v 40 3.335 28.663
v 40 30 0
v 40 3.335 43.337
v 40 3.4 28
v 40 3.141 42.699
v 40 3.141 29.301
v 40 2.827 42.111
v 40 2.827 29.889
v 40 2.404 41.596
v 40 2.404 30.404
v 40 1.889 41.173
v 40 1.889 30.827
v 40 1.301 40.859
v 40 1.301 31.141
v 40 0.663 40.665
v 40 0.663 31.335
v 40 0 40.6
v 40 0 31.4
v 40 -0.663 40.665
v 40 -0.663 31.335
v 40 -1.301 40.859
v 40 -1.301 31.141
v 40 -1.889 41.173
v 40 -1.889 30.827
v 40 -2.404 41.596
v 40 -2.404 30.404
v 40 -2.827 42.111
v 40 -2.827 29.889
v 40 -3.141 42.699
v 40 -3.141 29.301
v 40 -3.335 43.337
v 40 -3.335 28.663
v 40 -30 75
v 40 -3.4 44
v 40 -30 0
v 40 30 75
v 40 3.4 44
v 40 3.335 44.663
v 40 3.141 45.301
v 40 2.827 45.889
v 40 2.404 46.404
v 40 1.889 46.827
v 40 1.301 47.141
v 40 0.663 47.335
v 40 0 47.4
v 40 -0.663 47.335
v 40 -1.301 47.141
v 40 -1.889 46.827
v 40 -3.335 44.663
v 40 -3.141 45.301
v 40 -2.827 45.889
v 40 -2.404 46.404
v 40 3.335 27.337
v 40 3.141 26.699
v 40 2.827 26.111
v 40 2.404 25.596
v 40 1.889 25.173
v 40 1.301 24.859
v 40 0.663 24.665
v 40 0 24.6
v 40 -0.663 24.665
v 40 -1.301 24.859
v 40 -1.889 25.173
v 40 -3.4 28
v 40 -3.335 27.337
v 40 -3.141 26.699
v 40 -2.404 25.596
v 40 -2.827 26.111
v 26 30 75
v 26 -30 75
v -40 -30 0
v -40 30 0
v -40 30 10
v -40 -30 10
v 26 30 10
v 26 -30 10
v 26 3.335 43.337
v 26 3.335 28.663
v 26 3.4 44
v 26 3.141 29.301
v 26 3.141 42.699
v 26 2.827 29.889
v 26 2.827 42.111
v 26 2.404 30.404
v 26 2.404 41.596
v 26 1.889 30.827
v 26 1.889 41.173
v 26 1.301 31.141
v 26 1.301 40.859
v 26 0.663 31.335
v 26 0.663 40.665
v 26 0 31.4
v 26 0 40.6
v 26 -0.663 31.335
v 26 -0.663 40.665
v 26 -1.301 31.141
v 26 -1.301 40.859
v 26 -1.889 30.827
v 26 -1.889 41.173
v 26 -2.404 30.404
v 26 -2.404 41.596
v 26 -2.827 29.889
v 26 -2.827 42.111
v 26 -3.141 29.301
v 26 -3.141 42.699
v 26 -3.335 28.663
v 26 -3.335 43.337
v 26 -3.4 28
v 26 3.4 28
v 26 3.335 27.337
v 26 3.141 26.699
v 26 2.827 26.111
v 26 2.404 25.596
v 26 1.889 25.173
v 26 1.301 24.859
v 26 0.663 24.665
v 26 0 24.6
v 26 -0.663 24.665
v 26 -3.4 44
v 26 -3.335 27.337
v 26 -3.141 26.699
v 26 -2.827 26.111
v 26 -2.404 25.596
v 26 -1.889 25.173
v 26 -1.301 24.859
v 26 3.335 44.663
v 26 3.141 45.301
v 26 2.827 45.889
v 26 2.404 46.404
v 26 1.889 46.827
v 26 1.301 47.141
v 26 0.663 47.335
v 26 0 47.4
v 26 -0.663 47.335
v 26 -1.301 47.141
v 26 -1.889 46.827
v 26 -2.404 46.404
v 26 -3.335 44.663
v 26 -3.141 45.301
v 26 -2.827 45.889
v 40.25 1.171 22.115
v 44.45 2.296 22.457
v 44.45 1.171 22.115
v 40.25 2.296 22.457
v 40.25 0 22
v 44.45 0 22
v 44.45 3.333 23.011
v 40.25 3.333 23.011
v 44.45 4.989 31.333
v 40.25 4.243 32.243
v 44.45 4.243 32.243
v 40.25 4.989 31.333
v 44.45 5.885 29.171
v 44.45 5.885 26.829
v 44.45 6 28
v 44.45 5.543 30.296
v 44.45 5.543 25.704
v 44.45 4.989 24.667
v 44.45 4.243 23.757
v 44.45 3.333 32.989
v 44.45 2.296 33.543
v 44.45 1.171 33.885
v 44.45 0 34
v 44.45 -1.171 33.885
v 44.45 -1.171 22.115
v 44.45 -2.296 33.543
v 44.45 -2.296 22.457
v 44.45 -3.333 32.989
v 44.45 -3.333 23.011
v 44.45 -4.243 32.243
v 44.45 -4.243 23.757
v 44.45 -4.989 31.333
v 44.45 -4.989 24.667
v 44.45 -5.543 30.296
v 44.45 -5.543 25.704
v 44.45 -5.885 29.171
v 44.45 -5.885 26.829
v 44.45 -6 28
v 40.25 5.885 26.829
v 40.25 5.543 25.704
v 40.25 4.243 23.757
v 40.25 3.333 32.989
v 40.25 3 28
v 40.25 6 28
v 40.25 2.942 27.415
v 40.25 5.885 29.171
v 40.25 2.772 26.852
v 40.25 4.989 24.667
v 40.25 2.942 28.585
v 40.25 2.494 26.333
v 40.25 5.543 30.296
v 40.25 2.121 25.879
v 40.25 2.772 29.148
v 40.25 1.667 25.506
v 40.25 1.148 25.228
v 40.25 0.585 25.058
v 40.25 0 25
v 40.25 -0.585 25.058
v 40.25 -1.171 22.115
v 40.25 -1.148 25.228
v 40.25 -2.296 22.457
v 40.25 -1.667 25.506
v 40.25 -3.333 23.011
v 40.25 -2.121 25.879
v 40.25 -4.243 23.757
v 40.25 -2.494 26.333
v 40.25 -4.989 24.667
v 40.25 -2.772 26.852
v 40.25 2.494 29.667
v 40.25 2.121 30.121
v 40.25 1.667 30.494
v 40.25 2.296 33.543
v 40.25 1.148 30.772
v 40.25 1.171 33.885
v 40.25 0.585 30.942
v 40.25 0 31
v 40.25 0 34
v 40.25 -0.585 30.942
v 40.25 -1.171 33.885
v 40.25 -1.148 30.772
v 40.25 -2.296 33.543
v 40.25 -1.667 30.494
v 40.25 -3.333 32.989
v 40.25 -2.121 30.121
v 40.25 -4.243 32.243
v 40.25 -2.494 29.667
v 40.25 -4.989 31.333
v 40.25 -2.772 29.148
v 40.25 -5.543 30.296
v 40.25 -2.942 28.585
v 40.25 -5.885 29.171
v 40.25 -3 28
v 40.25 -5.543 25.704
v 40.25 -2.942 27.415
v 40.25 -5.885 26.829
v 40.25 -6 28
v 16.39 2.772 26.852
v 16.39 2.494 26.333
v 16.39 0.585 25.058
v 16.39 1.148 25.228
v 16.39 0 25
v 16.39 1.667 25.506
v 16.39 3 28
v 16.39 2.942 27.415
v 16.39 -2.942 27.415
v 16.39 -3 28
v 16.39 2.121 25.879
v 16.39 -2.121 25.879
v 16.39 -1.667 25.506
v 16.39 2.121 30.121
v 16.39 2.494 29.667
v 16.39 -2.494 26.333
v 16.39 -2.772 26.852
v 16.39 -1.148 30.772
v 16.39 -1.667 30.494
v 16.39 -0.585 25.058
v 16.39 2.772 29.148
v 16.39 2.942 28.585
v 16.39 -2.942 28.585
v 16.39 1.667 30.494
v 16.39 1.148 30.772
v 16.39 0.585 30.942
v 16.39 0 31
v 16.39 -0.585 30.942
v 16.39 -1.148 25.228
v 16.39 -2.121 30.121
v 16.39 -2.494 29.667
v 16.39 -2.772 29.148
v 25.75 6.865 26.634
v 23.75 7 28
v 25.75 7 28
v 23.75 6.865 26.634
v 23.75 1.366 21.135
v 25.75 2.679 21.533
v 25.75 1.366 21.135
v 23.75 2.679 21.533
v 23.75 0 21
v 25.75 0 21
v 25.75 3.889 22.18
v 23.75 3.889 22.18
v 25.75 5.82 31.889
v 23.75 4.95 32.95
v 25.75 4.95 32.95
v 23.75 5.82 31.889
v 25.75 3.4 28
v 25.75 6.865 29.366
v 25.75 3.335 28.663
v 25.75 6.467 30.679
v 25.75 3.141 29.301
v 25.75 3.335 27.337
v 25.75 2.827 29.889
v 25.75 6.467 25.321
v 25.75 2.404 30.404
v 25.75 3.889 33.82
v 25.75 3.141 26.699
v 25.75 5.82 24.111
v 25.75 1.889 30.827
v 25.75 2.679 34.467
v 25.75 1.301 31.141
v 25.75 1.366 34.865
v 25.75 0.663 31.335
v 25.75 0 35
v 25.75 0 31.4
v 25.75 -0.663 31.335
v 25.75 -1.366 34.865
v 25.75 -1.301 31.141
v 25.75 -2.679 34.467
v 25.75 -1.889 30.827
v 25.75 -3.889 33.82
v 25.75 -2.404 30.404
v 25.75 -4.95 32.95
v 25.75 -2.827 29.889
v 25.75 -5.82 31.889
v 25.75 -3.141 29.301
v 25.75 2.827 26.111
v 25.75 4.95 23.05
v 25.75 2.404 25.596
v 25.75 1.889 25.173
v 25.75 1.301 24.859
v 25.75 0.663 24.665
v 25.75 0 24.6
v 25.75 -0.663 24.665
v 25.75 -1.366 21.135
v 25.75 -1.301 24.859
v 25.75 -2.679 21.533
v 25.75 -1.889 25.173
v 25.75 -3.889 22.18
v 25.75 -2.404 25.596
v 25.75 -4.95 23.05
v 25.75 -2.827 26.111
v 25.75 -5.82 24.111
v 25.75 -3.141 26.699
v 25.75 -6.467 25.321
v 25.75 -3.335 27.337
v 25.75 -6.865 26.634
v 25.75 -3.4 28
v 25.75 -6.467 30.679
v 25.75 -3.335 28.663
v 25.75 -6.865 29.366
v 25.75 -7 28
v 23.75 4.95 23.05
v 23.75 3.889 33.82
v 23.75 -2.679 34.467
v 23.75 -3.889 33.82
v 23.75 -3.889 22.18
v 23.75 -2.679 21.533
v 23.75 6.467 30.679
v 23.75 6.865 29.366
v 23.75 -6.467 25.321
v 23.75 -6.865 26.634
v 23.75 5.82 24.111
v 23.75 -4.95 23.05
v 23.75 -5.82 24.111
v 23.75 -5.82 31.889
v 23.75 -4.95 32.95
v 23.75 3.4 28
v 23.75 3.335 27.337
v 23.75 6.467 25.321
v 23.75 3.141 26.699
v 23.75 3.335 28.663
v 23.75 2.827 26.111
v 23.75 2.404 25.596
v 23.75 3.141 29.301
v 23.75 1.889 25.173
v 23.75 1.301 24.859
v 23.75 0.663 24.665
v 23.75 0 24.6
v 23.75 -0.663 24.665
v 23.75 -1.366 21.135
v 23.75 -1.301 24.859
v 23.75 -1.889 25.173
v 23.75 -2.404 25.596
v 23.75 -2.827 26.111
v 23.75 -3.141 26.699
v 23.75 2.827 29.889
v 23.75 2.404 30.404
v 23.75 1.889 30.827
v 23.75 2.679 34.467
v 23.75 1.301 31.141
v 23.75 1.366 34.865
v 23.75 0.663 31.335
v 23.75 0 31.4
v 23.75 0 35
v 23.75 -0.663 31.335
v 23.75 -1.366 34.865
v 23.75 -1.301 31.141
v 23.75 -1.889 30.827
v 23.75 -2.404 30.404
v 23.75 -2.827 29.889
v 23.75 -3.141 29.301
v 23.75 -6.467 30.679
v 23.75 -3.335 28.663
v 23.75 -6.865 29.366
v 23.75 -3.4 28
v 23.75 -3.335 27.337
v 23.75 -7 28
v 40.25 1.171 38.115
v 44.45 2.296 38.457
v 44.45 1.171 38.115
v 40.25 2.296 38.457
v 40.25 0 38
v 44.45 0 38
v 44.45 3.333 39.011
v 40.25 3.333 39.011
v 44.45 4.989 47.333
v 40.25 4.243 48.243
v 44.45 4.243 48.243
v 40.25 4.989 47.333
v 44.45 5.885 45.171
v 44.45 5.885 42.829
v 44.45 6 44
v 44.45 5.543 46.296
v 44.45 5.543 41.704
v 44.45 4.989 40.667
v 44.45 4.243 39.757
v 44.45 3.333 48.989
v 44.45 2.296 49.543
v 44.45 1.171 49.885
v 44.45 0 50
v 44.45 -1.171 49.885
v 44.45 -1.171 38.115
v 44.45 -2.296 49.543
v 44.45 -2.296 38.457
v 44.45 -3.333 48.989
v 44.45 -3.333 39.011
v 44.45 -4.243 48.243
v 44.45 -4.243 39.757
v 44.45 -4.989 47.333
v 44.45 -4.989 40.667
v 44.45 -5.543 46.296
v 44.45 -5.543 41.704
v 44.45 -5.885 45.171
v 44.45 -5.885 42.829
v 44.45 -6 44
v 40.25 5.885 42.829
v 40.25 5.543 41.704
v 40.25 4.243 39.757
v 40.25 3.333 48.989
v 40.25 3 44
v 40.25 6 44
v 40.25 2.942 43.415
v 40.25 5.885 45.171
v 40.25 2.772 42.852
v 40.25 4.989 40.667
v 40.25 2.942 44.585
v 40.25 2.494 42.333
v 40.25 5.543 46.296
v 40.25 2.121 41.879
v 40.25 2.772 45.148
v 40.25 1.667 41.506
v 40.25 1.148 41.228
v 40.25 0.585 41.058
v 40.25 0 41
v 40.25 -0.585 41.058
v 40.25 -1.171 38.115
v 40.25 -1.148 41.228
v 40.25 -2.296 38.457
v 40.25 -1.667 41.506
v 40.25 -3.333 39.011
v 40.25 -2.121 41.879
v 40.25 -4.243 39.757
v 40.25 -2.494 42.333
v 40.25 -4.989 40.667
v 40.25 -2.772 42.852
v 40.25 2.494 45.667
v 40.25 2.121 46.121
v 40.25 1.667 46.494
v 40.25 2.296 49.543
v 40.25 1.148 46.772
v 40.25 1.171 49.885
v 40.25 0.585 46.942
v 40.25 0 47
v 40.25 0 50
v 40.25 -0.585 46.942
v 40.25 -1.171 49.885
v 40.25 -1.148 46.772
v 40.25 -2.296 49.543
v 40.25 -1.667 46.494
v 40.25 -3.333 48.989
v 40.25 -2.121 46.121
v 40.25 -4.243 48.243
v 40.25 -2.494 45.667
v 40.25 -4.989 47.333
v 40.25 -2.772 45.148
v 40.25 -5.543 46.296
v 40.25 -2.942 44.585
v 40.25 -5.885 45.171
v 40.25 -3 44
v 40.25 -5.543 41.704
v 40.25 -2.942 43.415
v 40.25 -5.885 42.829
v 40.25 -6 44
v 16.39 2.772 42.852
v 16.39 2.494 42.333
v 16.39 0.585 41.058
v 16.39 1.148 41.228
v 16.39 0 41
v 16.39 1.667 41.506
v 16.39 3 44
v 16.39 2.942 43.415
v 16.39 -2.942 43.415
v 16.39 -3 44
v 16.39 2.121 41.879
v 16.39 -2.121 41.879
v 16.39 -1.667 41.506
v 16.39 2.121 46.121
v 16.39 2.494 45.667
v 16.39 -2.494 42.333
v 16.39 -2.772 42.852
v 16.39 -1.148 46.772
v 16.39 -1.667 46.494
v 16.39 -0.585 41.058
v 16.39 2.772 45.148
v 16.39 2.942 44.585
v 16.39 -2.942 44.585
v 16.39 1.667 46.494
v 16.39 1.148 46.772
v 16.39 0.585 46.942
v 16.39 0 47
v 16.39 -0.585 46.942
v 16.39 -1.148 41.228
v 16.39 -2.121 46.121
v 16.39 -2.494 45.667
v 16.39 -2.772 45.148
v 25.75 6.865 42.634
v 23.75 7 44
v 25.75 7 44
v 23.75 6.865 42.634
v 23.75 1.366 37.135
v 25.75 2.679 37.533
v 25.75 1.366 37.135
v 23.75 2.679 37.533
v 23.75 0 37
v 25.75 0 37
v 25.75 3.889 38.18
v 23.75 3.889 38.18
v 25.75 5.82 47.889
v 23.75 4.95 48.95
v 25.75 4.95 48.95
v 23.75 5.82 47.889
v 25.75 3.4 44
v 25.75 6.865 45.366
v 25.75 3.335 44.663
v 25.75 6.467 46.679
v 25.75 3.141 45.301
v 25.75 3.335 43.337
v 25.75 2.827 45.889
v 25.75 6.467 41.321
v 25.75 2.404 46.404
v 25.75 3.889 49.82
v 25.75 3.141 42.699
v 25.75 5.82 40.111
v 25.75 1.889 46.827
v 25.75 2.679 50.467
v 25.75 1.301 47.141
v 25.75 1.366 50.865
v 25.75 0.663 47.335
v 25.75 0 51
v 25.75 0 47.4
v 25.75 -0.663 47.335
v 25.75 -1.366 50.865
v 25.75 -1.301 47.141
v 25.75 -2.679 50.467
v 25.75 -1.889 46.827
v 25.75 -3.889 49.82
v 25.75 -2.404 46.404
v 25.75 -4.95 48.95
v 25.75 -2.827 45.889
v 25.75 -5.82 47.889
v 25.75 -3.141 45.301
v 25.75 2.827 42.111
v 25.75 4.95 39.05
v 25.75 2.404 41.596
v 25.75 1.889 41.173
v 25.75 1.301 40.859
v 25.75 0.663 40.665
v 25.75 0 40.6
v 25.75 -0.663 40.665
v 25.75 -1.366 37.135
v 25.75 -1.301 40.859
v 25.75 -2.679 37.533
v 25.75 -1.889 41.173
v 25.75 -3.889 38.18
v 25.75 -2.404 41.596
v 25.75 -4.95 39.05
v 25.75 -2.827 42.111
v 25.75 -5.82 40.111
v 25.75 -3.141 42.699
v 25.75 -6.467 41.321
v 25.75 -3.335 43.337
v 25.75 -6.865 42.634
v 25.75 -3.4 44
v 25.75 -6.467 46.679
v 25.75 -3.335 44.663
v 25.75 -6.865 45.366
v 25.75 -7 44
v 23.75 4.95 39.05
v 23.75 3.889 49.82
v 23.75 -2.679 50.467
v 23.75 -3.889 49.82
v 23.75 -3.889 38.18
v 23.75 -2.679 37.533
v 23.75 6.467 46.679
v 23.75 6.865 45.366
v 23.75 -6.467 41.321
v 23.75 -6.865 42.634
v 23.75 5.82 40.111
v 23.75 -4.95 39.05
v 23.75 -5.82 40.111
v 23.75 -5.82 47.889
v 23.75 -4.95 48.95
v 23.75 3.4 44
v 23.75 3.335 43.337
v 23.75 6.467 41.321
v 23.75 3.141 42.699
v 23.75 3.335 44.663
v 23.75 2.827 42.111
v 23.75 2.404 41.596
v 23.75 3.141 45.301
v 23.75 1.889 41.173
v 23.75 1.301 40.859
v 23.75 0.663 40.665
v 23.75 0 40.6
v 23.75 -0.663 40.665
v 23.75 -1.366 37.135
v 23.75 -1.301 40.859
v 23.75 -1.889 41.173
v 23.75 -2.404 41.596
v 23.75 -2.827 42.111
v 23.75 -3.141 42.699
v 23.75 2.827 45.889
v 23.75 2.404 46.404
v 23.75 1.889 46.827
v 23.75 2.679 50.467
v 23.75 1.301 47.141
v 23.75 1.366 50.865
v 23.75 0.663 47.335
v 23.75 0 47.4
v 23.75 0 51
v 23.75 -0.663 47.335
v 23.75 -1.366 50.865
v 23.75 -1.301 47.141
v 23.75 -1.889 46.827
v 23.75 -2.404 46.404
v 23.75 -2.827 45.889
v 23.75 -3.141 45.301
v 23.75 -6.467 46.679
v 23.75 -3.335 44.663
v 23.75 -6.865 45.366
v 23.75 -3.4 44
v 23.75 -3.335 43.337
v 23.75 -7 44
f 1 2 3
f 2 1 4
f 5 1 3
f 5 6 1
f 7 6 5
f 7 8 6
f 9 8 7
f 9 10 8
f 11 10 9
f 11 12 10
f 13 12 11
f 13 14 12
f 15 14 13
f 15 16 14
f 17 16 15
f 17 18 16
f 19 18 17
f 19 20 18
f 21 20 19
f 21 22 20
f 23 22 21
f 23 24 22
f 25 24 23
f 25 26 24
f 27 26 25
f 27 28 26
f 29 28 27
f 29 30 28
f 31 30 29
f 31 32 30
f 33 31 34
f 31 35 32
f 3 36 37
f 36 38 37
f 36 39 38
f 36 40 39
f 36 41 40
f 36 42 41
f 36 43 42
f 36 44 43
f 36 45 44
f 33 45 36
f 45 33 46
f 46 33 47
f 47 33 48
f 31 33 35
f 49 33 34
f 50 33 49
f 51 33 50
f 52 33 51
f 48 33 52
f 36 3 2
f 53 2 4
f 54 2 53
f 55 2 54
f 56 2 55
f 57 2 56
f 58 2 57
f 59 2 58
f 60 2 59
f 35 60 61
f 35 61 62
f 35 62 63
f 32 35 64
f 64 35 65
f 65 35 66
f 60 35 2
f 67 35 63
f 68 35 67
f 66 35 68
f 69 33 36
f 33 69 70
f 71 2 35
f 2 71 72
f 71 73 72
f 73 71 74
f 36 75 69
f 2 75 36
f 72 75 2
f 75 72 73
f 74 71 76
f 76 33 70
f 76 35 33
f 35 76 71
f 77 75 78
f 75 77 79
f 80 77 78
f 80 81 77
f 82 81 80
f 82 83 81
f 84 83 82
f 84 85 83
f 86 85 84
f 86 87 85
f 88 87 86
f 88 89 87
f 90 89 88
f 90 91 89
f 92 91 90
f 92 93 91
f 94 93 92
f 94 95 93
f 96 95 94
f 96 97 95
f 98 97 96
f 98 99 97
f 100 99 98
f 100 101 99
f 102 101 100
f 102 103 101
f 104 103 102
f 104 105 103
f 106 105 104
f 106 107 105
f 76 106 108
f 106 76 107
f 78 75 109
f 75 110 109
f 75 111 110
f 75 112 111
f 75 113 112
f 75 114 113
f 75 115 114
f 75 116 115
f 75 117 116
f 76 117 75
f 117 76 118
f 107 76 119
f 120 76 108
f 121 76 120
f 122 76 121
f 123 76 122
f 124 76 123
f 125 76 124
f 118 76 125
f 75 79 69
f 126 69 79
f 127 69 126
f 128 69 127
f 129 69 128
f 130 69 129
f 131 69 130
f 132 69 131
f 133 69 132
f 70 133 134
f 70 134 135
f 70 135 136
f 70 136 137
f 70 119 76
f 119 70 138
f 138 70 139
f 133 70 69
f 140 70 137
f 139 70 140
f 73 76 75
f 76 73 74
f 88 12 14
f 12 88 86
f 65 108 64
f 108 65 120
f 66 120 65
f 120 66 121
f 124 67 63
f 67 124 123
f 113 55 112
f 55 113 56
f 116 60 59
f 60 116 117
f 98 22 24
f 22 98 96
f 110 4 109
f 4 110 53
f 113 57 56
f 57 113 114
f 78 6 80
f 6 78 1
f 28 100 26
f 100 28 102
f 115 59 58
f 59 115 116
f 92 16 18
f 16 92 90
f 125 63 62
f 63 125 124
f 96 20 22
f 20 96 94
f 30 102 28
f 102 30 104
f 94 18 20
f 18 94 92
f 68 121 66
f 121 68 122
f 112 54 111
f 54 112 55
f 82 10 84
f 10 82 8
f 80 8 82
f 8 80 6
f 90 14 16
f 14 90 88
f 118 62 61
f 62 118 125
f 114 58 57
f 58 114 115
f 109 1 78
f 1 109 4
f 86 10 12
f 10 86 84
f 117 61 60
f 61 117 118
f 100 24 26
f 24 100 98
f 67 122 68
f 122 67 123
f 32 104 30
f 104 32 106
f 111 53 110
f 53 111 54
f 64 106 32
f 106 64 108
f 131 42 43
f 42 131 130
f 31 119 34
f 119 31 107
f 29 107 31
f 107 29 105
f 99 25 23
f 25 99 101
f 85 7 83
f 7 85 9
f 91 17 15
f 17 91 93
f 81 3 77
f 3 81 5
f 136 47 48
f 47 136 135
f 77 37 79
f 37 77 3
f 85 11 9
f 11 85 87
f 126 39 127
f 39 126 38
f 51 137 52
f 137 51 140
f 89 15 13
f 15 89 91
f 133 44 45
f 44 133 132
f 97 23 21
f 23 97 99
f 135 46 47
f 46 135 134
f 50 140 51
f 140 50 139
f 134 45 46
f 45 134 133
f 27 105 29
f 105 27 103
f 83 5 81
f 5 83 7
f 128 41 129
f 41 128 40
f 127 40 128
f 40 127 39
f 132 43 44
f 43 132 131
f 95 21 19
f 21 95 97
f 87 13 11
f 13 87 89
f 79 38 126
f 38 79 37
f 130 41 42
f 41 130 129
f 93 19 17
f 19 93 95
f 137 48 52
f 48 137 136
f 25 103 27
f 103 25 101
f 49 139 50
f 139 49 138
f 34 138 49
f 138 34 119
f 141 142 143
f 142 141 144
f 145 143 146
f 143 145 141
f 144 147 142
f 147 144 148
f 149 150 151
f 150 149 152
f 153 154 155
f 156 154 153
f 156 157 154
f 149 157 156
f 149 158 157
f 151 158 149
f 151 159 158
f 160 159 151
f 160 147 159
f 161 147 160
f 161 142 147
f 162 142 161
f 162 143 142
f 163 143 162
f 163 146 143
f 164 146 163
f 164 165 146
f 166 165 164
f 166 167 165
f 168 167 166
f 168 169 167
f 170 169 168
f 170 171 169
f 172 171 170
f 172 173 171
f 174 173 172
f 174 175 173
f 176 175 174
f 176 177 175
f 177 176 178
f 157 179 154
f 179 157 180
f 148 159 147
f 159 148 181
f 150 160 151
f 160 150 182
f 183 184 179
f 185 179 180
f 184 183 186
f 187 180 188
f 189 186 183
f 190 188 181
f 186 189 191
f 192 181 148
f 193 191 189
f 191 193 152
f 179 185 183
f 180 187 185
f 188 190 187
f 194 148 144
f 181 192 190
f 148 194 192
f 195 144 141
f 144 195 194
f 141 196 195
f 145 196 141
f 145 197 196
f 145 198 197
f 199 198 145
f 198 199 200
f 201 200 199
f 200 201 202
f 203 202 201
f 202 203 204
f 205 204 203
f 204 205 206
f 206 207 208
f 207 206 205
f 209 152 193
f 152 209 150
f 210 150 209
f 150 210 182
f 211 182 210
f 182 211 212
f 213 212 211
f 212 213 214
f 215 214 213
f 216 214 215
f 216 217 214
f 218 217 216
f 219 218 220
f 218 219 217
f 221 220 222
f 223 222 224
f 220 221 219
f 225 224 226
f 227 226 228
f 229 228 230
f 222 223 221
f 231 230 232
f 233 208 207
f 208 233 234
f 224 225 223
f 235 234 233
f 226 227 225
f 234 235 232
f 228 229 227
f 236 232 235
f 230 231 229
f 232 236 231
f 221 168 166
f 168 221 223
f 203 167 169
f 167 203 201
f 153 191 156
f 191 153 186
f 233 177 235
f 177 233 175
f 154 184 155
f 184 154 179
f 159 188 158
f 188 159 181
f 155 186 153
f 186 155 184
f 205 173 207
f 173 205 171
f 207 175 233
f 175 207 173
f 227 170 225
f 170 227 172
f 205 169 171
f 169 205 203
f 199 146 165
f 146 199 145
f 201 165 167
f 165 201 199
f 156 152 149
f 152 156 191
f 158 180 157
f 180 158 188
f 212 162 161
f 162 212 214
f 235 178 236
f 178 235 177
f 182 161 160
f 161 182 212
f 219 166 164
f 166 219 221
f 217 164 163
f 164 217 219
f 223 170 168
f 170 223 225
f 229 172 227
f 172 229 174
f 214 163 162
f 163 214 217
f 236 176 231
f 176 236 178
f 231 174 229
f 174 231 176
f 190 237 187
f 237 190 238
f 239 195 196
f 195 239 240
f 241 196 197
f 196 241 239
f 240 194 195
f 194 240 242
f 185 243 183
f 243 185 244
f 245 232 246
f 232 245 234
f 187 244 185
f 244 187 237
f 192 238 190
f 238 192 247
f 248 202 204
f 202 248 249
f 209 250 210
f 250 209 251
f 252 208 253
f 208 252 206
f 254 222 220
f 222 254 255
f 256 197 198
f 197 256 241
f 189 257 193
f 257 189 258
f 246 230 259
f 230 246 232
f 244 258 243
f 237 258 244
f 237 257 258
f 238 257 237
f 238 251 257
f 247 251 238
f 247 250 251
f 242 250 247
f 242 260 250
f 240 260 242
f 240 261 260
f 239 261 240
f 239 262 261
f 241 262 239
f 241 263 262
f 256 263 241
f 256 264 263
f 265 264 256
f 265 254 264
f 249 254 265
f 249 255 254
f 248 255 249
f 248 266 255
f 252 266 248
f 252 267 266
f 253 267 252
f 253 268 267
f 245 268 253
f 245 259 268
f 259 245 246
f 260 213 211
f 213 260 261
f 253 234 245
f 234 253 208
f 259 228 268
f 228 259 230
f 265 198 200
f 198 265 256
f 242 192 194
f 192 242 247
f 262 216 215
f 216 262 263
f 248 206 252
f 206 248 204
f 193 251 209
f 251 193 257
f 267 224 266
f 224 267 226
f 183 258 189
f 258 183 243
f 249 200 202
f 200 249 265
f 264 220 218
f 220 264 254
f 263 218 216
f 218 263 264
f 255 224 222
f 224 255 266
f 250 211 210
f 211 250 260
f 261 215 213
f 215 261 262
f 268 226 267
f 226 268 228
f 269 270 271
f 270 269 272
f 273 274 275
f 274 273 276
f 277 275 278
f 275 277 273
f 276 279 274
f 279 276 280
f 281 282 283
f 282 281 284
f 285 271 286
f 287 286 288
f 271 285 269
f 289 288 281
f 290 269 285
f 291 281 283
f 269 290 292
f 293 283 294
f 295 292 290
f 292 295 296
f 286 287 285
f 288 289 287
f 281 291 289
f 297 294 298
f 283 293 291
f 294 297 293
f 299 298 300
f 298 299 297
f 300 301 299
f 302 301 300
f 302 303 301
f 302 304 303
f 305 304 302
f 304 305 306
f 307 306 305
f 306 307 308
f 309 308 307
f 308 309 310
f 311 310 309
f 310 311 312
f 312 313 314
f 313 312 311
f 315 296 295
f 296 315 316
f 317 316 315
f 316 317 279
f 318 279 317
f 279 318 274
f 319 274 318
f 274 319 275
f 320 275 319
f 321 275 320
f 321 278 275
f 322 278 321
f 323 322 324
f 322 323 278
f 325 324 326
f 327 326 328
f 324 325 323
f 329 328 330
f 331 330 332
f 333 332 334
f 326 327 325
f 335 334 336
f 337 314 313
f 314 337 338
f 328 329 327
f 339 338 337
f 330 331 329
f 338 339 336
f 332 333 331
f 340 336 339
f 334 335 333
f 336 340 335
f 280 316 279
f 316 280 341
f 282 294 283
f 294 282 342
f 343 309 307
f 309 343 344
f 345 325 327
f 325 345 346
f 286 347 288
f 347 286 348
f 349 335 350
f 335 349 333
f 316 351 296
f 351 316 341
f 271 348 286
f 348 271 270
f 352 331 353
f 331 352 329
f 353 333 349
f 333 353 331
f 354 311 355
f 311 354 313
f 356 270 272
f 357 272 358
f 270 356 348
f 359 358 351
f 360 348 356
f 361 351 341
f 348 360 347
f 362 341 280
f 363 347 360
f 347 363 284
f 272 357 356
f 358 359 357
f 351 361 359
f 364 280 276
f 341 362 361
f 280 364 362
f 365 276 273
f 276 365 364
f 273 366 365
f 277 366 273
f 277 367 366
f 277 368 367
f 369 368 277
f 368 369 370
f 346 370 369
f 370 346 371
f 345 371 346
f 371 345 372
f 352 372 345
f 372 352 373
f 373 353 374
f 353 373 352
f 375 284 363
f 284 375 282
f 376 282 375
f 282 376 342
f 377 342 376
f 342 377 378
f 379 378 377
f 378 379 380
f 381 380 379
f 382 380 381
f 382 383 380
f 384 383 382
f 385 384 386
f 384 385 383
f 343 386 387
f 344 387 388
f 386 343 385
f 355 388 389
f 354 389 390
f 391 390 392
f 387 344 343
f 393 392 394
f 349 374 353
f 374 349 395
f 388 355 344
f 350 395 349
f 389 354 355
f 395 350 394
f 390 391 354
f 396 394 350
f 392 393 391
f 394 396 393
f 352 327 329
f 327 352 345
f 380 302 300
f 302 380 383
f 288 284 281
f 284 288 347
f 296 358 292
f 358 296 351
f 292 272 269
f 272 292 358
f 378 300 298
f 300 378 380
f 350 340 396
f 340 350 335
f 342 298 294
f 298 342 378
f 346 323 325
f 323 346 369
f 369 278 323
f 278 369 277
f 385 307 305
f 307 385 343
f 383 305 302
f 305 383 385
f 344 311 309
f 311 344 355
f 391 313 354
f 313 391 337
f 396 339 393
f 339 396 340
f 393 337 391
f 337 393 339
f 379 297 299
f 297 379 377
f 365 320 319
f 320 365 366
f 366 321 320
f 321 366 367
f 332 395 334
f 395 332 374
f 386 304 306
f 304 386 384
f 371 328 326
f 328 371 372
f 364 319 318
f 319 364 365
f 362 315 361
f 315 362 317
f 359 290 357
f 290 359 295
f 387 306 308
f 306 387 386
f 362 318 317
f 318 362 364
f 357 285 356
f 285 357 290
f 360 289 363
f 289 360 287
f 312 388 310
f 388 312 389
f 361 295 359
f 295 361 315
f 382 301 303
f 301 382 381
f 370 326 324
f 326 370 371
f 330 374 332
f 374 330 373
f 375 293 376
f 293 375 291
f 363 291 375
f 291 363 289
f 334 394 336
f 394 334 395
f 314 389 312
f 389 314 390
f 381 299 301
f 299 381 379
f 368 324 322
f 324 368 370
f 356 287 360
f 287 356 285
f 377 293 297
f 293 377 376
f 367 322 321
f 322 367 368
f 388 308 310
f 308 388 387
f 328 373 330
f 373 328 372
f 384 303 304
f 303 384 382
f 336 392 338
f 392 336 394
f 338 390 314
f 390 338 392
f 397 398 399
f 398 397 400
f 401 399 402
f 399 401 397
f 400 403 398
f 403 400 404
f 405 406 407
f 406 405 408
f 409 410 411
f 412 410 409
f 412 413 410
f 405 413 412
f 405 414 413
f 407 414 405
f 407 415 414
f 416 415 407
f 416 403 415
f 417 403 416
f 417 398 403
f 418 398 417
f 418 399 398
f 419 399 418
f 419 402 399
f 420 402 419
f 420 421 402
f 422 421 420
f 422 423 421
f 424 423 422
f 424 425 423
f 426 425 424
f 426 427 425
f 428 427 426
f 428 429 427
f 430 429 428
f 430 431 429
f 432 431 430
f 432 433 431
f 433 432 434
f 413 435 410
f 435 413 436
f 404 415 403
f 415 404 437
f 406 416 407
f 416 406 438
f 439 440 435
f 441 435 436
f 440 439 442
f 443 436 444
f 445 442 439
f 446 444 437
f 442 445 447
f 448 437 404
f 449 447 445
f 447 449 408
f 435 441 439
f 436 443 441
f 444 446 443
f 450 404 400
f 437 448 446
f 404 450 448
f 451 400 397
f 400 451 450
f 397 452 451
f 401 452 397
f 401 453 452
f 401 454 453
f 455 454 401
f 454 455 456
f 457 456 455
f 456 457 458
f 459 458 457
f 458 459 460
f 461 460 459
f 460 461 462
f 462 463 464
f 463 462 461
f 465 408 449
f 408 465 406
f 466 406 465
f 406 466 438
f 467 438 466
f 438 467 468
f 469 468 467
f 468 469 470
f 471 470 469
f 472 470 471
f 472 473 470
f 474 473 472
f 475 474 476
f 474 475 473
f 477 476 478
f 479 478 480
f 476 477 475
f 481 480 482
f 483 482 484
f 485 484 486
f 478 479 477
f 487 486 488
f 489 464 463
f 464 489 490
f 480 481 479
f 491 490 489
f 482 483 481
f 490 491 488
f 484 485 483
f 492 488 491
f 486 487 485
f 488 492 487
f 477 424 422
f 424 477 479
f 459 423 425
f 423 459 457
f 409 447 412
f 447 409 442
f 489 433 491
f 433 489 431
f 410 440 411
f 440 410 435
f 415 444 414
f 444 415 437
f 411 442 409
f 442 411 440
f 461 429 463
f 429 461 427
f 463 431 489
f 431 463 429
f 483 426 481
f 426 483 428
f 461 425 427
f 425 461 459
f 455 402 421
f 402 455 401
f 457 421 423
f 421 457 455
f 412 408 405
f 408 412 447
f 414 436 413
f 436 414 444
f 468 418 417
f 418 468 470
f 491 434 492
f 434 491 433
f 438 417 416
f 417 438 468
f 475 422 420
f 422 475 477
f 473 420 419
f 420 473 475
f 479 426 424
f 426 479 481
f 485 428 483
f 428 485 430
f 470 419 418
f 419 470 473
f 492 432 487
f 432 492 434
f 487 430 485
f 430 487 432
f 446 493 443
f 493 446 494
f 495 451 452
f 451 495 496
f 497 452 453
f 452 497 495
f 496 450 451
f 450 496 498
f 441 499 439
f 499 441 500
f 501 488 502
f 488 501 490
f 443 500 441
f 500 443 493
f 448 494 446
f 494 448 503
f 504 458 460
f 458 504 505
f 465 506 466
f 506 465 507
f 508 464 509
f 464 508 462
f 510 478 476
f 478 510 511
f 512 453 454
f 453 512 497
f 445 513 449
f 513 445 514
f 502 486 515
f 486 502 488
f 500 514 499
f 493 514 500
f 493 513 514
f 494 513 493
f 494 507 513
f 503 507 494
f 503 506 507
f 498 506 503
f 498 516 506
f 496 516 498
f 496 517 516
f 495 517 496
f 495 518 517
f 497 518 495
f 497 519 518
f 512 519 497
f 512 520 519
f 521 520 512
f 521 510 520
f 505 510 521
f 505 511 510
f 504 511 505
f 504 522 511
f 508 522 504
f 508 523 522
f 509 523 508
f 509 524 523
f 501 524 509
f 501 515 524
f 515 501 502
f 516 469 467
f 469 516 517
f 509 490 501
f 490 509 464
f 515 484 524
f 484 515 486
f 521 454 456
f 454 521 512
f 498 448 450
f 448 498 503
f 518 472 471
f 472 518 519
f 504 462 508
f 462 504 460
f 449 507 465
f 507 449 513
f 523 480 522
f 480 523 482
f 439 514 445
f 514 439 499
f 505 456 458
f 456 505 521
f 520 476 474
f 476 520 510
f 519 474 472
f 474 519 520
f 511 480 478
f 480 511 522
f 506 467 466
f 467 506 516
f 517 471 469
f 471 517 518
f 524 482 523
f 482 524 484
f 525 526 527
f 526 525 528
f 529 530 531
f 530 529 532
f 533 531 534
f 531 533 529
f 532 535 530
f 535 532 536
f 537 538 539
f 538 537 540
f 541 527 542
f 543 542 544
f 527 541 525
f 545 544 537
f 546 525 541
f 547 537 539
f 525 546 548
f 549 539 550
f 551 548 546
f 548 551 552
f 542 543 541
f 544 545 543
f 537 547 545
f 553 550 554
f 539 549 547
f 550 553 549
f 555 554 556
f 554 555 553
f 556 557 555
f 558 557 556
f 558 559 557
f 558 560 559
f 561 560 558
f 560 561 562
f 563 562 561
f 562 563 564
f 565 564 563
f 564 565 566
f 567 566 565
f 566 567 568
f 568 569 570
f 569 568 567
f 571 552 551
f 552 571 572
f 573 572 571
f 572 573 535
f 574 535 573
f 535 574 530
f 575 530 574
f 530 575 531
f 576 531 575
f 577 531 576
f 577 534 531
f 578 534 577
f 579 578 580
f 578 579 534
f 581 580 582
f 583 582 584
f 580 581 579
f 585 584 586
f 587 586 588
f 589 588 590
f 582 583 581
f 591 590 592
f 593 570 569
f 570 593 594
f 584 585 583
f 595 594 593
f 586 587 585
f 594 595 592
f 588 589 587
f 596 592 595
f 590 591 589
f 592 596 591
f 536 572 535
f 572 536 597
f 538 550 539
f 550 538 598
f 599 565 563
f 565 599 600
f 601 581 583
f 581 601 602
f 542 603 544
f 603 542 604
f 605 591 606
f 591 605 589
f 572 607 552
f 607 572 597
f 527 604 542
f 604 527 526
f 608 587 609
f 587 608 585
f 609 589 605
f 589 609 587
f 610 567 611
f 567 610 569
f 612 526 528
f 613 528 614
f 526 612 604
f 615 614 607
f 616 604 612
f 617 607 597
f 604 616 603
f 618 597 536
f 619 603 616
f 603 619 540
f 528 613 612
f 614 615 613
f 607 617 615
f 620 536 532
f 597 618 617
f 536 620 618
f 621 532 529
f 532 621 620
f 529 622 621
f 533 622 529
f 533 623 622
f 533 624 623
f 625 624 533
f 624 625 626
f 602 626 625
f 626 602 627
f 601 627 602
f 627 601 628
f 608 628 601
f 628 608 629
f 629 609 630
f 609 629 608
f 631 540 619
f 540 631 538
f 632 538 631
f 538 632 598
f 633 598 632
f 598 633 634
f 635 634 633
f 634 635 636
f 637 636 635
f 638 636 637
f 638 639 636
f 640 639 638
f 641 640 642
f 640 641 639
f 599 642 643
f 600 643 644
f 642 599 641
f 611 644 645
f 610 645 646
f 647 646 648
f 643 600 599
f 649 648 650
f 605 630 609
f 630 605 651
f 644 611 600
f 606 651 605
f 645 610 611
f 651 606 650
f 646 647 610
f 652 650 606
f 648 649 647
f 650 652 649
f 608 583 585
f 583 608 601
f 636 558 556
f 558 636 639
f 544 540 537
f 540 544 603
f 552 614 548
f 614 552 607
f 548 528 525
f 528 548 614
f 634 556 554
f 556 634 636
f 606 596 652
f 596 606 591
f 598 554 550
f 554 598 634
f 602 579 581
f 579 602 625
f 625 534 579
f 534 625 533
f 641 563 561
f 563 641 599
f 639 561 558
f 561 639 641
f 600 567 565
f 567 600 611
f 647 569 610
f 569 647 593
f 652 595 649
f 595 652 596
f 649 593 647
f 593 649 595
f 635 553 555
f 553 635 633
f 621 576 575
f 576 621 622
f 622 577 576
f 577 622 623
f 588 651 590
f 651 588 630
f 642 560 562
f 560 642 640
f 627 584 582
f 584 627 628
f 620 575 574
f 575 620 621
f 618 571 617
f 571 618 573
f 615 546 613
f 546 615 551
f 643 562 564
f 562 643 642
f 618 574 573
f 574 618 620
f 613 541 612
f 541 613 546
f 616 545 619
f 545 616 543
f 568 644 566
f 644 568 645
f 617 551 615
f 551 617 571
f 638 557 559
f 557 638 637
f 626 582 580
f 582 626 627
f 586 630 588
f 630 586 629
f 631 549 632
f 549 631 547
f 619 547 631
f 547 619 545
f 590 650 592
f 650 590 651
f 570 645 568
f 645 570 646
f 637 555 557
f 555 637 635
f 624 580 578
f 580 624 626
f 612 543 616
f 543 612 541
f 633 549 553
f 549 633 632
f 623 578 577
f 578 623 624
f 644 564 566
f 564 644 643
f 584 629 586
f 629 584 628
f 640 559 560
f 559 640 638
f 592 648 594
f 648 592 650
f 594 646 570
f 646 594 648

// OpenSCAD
$fn = 32;

// ------------------------------------------------------------------------
// Bolted bracket: 80 x 60 mm bracket with 2 bolt joints
// Every part is its own module, assembly() places them once.
// ------------------------------------------------------------------------

// --- part 1 ---
module bracket() {
  difference() {
    translate([-40, -30, 0]) cube([80, 60, 75]);
    translate([-41, -31, 10]) cube([67, 62, 66]);
    translate([33, 0, 28]) rotate([0, 90, 0]) cylinder(h = 16, d = 6.8, center = true);
    translate([33, 0, 44]) rotate([0, 90, 0]) cylinder(h = 16, d = 6.8, center = true);
  }
}

// --- part 2 ---
module bolt1() {
  cylinder(h = 4.2, d = 12);
  translate([0, 0, -23.86]) cylinder(h = 23.86, d = 6);
}

// --- part 3 ---
module washer1() {
  difference() {
      translate([0, 0, 0]) cylinder(h = 2, d = 14);
      translate([0, 0, -1]) cylinder(h = 4, d = 6.8);
    }
}

// --- part 4 ---
module bolt2() {
  cylinder(h = 4.2, d = 12);
  translate([0, 0, -23.86]) cylinder(h = 23.86, d = 6);
}

// --- part 5 ---
module washer2() {
  difference() {
      translate([0, 0, 0]) cylinder(h = 2, d = 14);
      translate([0, 0, -1]) cylinder(h = 4, d = 6.8);
    }
}

// --- assembly ---
module assembly() {
  translate([0, 0, 0]) rotate([0, 0, 0]) bracket();
  translate([40.25, 0, 28]) rotate([0, 90, 0]) bolt1();
  translate([23.75, 0, 28]) rotate([0, 90, 0]) washer1();
  translate([40.25, 0, 44]) rotate([0, 90, 0]) bolt2();
  translate([23.75, 0, 44]) rotate([0, 90, 0]) washer2();
}

assembly();
